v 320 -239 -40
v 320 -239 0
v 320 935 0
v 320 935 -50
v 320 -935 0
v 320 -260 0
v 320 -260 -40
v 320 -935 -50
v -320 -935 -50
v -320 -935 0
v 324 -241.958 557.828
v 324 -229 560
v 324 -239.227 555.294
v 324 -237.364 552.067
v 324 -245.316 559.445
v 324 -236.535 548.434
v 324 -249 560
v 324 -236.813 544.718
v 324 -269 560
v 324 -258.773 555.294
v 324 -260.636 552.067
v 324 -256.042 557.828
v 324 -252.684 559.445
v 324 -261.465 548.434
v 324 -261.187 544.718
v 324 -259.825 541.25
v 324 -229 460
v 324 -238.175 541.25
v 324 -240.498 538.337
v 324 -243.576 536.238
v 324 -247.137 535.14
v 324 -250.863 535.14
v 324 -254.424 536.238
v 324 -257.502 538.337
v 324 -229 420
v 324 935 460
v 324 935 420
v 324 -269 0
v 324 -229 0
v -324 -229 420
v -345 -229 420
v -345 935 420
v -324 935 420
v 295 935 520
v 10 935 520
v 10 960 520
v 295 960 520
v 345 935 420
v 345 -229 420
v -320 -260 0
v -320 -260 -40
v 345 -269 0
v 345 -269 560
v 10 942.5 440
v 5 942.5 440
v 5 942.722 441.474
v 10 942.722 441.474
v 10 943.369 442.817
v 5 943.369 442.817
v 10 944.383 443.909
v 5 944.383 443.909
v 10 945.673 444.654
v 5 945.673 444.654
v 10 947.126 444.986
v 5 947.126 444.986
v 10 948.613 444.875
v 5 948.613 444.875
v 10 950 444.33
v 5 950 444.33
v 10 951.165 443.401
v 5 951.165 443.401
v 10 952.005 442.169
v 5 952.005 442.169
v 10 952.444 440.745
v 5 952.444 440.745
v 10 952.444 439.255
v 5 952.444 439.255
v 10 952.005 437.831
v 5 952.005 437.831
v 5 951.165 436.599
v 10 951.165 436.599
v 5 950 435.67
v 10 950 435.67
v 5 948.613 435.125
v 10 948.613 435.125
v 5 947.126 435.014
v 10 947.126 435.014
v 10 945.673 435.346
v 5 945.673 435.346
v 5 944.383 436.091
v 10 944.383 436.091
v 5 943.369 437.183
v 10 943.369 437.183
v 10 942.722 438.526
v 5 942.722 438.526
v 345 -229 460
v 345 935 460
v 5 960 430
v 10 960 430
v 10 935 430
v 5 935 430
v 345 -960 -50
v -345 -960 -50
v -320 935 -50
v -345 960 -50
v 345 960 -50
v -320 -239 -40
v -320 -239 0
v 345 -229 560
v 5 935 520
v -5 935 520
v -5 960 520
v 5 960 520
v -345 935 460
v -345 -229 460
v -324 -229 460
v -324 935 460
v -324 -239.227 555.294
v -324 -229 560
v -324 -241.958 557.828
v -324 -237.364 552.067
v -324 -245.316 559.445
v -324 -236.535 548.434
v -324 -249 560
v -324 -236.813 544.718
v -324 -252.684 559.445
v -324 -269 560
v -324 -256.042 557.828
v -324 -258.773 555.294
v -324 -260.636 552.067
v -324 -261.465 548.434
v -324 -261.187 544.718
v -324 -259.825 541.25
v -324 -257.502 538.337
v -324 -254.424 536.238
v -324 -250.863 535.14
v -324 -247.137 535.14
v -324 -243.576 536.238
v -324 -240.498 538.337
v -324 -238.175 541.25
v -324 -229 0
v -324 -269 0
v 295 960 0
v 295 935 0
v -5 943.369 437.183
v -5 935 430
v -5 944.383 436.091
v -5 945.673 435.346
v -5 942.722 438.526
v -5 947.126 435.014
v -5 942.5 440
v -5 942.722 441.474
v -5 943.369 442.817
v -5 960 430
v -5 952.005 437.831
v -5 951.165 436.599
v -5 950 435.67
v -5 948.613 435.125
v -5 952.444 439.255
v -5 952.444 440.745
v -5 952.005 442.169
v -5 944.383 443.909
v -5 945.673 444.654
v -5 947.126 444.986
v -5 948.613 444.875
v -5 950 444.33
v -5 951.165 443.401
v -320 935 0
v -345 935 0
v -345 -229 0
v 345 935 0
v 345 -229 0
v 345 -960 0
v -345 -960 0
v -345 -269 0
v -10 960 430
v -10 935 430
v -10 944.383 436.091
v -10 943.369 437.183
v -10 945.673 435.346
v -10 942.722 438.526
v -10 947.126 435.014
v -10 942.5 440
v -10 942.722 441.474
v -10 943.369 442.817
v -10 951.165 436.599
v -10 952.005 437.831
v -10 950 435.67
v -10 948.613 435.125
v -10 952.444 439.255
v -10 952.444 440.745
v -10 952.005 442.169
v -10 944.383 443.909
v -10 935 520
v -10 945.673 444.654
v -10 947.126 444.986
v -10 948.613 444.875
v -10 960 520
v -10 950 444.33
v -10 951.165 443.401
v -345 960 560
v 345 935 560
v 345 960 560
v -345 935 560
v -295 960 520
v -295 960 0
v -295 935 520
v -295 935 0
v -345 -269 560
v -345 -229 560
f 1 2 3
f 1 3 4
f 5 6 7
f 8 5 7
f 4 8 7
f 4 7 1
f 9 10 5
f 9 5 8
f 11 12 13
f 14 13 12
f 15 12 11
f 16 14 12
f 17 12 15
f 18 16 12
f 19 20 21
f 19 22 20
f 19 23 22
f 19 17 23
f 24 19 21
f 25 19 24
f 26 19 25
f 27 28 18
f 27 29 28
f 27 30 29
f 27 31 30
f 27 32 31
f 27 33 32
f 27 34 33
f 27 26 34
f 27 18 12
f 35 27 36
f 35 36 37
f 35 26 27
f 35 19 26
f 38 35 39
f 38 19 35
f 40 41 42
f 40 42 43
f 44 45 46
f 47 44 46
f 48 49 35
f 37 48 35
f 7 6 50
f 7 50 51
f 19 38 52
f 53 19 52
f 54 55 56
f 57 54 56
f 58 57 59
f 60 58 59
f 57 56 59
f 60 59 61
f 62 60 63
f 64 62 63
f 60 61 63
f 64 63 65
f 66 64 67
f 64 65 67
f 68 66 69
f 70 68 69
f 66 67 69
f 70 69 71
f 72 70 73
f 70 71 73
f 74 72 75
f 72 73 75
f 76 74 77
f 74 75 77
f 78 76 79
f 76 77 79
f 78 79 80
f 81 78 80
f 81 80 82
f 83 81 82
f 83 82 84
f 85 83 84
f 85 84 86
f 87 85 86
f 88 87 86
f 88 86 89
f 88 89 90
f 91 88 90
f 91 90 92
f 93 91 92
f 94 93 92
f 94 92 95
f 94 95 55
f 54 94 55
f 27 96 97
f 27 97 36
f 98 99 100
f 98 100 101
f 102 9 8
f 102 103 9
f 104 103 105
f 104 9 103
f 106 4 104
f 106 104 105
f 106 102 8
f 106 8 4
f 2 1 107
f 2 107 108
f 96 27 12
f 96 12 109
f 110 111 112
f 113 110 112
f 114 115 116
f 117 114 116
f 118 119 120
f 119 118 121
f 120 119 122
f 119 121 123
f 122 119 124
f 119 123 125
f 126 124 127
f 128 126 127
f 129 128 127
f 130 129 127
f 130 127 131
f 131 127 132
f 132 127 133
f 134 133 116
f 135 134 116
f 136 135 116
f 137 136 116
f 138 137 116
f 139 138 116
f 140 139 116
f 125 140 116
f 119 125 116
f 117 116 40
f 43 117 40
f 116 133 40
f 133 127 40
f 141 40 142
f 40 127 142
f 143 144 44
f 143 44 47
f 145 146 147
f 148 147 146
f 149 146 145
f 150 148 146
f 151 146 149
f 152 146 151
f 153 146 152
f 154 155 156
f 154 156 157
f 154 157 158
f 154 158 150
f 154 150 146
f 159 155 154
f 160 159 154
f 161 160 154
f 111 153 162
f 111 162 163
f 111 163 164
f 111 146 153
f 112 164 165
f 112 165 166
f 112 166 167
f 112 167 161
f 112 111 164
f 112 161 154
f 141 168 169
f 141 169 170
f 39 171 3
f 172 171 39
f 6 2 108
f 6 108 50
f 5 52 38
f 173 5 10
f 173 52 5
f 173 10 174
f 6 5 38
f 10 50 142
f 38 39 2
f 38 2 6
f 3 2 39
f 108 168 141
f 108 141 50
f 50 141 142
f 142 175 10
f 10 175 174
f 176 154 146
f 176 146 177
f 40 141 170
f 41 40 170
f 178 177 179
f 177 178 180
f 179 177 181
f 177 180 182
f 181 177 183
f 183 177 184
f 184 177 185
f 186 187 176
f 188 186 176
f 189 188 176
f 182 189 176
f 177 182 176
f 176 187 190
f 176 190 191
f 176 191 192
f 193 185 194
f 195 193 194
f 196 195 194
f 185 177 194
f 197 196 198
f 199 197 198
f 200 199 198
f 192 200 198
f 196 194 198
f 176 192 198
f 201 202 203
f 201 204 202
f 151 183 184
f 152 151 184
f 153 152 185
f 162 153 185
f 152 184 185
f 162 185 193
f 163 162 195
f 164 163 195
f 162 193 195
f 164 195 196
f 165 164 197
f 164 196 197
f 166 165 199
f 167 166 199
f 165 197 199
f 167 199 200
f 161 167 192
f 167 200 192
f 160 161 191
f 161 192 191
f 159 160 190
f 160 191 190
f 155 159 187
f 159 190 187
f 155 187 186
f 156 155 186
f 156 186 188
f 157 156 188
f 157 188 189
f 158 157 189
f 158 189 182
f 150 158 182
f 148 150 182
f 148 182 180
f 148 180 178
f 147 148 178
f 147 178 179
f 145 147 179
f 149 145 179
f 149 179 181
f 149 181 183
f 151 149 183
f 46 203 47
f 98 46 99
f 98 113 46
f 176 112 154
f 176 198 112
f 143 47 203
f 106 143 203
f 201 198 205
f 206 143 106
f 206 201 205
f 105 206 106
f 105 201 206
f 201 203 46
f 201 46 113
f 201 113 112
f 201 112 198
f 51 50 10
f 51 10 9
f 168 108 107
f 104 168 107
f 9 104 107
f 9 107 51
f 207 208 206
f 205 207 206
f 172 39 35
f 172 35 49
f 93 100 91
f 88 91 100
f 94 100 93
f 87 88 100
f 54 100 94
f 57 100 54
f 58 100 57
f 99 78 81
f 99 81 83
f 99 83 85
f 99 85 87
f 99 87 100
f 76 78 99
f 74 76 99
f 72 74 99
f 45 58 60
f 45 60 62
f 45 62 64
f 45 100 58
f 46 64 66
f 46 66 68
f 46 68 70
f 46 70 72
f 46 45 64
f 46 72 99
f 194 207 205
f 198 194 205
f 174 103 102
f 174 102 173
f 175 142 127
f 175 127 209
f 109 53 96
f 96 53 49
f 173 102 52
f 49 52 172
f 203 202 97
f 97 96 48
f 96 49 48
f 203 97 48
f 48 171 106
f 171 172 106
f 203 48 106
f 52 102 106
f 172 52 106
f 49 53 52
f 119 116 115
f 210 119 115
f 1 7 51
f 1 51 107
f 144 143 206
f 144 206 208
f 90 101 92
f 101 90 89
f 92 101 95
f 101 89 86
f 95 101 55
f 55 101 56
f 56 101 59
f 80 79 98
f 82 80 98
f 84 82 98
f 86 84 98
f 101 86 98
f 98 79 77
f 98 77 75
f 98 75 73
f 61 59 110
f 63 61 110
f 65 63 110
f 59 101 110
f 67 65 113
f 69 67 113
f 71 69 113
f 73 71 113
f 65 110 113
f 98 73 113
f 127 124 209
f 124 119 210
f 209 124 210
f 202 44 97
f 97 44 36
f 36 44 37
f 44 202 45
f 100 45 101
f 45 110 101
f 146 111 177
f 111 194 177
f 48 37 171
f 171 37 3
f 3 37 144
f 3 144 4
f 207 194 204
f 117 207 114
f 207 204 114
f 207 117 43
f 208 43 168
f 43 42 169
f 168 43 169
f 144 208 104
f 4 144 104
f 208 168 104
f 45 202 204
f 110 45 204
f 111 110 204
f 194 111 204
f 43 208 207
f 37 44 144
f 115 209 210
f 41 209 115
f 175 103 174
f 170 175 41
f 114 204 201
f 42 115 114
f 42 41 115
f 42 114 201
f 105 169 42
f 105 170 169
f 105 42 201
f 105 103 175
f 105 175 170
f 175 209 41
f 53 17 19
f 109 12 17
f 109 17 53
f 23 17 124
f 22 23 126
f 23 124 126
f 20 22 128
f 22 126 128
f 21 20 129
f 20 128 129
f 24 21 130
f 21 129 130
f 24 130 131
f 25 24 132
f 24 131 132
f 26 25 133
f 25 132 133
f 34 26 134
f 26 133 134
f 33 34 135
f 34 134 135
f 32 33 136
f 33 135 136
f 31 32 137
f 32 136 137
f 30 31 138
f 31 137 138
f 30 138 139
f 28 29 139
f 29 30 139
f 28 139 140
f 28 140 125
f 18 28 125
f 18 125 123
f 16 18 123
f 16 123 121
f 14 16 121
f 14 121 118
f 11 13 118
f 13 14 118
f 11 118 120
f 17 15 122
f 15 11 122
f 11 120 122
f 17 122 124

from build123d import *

# Parameters (mm, degrees)
SKETCH5_W            = 50
SKETCH5_H            = 25
SKETCH7_W            = 40
SKETCH7_H            = 21
SKETCH9_W            = 21
SKETCH9_H            = 40
BOSS_EXTRUDE2_DEPTH  = 560
SKETCH10_W           = 50
SKETCH10_H           = 25
BOSS_EXTRUDE3_DEPTH  = 560
SKETCH11_W           = 40
SKETCH11_H           = 25
BOSS_EXTRUDE4_DEPTH  = 590
BOSS_EXTRUDE7_REACH  = 1360.803
SKETCH13_W           = 21
SKETCH13_H           = 40
BOSS_EXTRUDE11_REACH = 1299.213
SKETCH19_R           = 12.5
SKETCH21_W           = 5
SKETCH21_H           = 25
BOSS_EXTRUDE13_DEPTH = 90
SKETCH22_R           = 5
CUT_EXTRUDE1_DEPTH   = 90


with BuildPart() as part:
    # Sweep3: sweep along a path in Sketch1
    with BuildLine(Plane.XY) as sweep3_path:
        Line((-345, 960), (345, 960))
        Line((345, 960), (345, -960))
        Line((345, -960), (-345, -960))
        Line((-345, -960), (-345, 960))
    # Sketch5 → Sweep3 (sweep)
    with BuildSketch(Plane(origin=(-345, 960, 0), x_dir=(0, 0, -1), z_dir=(1, 0, 0))):
        with Locations((25, -12.5)):
            Rectangle(SKETCH5_W, SKETCH5_H)
    sweep(path=sweep3_path.line, transition=Transition.RIGHT)

    # Sweep4: sweep along a path in Sketch6
    with BuildLine(Plane.XY) as sweep4_path:
        Line((-345, -260), (345, -260))
    # Sketch7 → Sweep4 (sweep)
    with BuildSketch(Plane(origin=(345, -260, 0), x_dir=(0, 0, -1), z_dir=(1, 0, 0))):
        with Locations((20, 10.5)):
            Rectangle(SKETCH7_W, SKETCH7_H)
    sweep(path=sweep4_path.line)

    # Sketch9 → Boss-Extrude2 (add)
    with BuildSketch(Plane.XY):
        with Locations((334.5, -249)):
            Rectangle(SKETCH9_W, SKETCH9_H)
    boss_extrude2 = extrude(amount=BOSS_EXTRUDE2_DEPTH)

    # Mirror1: Boss-Extrude2 across plane
    add(boss_extrude2.mirror(Plane(origin=(0, 0, 0), x_dir=(0, 0, 1), z_dir=(1, 0, 0))))

    # Sketch10 → Boss-Extrude3 (add)
    with BuildSketch(Plane.XY):
        with Locations((320, 947.5)):
            Rectangle(SKETCH10_W, SKETCH10_H)
    boss_extrude3 = extrude(amount=BOSS_EXTRUDE3_DEPTH)

    # Mirror3: Boss-Extrude3 across plane
    add(boss_extrude3.mirror(Plane(origin=(0, 0, 0), x_dir=(0, 0, 1), z_dir=(1, 0, 0))))

    # Sketch11 → Boss-Extrude4 (add)
    with BuildSketch(Plane(origin=(-295, 0, 0), x_dir=(0, 0, -1), z_dir=(1, 0, 0))):
        with Locations((-540, 947.5)):
            Rectangle(SKETCH11_W, SKETCH11_H)
    extrude(amount=BOSS_EXTRUDE4_DEPTH)

    # Sketch13 → Boss-Extrude7 (add, up to next)
    with BuildSketch(Plane(origin=(0, -229, 0), x_dir=(1, 0, 0), z_dir=(0, 1, 0)), mode=Mode.PRIVATE) as boss_extrude7_sk1:
        with Locations((-334.5, -440)):
            Rectangle(SKETCH13_W, SKETCH13_H)
    boss_extrude7_tool1 = extrude(boss_extrude7_sk1.sketch, amount=BOSS_EXTRUDE7_REACH, mode=Mode.PRIVATE) - part.part
    boss_extrude7 = boss_extrude7_tool1.solids().sort_by_distance((-334.5, -229, 440))[0]
    add(boss_extrude7)

    # Mirror7: Boss-Extrude7 across plane
    add(boss_extrude7.mirror(Plane(origin=(0, 0, 0), x_dir=(0, 0, 1), z_dir=(1, 0, 0))))

    # Sketch19 → Boss-Extrude11 (add, up to next)
    with BuildSketch(Plane(origin=(-324, 0, 0), x_dir=(0, 0, -1), z_dir=(1, 0, 0)), mode=Mode.PRIVATE) as boss_extrude11_sk1:
        with Locations(Location((-547.5, -249, 0), (0, 0, 180))):
            Circle(SKETCH19_R)
    boss_extrude11_tool1 = extrude(boss_extrude11_sk1.sketch, amount=BOSS_EXTRUDE11_REACH, mode=Mode.PRIVATE) - part.part
    add(boss_extrude11_tool1.solids().sort_by_distance((-324, -249, 547.5))[0])

    # Sketch21 → Boss-Extrude13 (add)
    with BuildSketch(Plane(origin=(0, 0, 520), x_dir=(-1, 0, 0), z_dir=(0, 0, -1))):
        with Locations((-7.5, 947.5)):
            Rectangle(SKETCH21_W, SKETCH21_H)
        with Locations((7.5, 947.5)):
            Rectangle(SKETCH21_W, SKETCH21_H)
    extrude(amount=BOSS_EXTRUDE13_DEPTH)

    # Sketch22 → Cut-Extrude1 (cut)
    with BuildSketch(Plane.ZY.offset(10)):
        with Locations(Location((440, 947.5, 0), (0, 0, 270))):
            Circle(SKETCH22_R)
    extrude(amount=-CUT_EXTRUDE1_DEPTH, mode=Mode.SUBTRACT)


solid = part.part
